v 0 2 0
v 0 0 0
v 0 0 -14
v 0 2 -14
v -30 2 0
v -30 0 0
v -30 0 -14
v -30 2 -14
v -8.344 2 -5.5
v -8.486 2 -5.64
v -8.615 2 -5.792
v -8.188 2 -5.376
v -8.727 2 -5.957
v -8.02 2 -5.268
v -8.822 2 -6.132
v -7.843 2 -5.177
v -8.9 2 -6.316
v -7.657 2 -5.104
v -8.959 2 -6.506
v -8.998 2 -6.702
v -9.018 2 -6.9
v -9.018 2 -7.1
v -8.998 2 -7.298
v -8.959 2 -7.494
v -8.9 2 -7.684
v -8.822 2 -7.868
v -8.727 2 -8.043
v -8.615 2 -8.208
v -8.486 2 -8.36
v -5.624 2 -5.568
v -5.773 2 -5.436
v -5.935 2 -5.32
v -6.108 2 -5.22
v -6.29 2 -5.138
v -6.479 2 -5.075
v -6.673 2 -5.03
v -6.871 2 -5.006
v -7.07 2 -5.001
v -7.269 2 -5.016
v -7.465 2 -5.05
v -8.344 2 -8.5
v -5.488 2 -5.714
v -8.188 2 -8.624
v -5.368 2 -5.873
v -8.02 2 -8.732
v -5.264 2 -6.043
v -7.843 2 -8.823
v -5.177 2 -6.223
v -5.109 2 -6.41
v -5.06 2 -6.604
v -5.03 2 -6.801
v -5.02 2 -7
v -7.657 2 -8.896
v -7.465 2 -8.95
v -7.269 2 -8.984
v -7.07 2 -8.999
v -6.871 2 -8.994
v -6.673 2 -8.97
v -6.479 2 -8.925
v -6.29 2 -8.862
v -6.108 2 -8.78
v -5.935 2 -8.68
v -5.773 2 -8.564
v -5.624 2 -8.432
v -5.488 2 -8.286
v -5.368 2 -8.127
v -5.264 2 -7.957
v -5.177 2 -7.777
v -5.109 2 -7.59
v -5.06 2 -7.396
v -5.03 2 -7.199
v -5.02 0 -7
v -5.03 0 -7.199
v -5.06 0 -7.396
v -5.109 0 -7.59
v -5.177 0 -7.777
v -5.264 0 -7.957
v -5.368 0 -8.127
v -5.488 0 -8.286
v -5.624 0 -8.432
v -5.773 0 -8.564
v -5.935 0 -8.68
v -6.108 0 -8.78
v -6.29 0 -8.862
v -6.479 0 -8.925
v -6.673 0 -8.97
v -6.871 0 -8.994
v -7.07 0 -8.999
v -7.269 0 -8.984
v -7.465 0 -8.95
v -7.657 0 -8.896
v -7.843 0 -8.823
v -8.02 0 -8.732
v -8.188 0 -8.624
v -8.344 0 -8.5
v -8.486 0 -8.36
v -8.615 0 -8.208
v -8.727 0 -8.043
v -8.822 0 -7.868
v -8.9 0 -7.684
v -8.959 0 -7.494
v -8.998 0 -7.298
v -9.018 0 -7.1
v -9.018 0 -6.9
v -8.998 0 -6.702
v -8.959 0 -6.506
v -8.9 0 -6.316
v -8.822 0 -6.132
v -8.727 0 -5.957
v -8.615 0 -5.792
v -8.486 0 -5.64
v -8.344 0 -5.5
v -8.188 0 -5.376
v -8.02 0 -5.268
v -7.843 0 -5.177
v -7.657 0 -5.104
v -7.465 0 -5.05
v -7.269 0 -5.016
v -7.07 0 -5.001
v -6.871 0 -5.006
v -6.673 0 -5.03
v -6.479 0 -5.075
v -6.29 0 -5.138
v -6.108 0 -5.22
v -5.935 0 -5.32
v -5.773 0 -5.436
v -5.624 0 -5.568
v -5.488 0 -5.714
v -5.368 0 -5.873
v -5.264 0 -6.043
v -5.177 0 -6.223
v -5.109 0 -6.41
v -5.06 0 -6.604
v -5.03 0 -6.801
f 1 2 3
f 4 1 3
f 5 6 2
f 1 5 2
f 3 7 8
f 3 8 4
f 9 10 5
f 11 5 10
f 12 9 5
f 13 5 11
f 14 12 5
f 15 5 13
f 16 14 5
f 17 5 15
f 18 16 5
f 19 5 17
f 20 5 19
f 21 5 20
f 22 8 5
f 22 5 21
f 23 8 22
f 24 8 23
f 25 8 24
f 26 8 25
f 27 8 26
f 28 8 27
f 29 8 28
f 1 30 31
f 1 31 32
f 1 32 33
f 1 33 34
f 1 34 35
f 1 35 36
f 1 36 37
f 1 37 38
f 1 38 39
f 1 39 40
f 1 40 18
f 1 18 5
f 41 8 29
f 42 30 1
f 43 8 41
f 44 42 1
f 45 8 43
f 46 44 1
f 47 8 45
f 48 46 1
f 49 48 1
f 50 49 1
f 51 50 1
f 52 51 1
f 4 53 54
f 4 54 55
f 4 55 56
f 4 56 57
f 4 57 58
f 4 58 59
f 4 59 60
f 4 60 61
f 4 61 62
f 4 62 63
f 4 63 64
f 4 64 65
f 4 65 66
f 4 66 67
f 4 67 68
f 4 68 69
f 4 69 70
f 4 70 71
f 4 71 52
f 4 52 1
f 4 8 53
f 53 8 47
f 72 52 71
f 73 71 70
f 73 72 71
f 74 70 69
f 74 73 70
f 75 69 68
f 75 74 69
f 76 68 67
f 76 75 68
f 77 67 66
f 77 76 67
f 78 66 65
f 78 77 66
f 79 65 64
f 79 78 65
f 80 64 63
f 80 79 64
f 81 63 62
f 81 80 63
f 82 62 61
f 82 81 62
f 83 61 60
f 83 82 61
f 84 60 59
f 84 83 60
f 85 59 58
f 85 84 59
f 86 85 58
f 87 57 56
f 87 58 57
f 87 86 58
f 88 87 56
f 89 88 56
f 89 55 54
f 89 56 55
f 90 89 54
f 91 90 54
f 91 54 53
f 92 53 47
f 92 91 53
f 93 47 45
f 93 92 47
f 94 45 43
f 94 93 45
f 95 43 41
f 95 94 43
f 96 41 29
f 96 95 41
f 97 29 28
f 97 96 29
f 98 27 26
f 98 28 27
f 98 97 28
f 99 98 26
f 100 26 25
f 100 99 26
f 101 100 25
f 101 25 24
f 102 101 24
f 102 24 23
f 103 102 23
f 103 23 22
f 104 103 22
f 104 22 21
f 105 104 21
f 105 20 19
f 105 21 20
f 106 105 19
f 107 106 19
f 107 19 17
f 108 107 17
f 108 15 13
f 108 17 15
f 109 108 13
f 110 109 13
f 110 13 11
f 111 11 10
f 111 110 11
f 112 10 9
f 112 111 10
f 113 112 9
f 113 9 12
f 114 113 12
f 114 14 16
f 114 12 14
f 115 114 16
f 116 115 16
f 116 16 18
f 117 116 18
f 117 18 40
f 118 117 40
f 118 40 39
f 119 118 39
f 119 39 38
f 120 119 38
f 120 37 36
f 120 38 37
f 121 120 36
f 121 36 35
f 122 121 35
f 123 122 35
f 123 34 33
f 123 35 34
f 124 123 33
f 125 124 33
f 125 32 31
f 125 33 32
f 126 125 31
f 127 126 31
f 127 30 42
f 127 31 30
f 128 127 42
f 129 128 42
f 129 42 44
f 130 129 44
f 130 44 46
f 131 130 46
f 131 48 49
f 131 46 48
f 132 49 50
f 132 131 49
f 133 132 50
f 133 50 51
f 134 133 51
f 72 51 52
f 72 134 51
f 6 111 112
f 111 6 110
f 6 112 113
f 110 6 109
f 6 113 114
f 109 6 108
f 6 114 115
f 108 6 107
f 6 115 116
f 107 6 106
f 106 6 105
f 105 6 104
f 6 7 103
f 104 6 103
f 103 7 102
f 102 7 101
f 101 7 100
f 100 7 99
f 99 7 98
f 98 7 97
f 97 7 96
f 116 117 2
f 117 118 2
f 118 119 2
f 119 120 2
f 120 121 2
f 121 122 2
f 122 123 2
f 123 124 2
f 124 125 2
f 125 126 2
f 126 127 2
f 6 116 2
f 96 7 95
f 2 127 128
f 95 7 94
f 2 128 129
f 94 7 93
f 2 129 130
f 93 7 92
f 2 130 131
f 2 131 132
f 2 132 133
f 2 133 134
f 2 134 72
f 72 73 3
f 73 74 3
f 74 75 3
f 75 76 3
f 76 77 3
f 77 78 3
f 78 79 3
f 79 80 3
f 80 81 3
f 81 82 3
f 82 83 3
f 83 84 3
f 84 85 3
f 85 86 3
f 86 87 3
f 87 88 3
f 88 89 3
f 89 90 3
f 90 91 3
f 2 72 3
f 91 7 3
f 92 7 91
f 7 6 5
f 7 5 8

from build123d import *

# Parameters (mm, degrees)
SKETCH1_W                = 30
SKETCH1_H                = 14
BOSS_EXTRUDE1_DEPTH      = 2
SKETCH1_9_OUTSIDE_W      = 38.634
SKETCH1_9_OUTSIDE_H      = 22.634
SKETCH1_9_OUTSIDE_W_2    = 30
SKETCH1_9_OUTSIDE_H_2    = 14
SKETCH1_9_OUTSIDE_R      = 2
CUT_EXTRUDE10_DEPTH      = 3
CUT_EXTRUDE10_DEPTH_BACK = 1


with BuildPart() as part:
    # Sketch1 → Boss-Extrude1 (new body)
    with BuildSketch(Plane(origin=(0, 0, 0), x_dir=(1, 0, 0), z_dir=(0, 1, 0))):
        with Locations((-15, 7)):
            Rectangle(SKETCH1_W, SKETCH1_H)
    extrude(amount=BOSS_EXTRUDE1_DEPTH)

    # Sketch1<9> outside → Cut-Extrude10 (cut, two sides)
    with BuildSketch(Plane(origin=(0, 0, 0), x_dir=(1, 0, 0), z_dir=(0, 1, 0))) as cut_extrude10_sk:
        with Locations((-15, 7)):
            Rectangle(SKETCH1_9_OUTSIDE_W, SKETCH1_9_OUTSIDE_H)
        with Locations((-15, 7)):
            Rectangle(SKETCH1_9_OUTSIDE_W_2, SKETCH1_9_OUTSIDE_H_2, mode=Mode.SUBTRACT)
        with Locations((-7.020370045, 7)):
            Circle(SKETCH1_9_OUTSIDE_R)
    extrude(amount=CUT_EXTRUDE10_DEPTH, mode=Mode.SUBTRACT)
    extrude(cut_extrude10_sk.sketch, amount=-CUT_EXTRUDE10_DEPTH_BACK, mode=Mode.SUBTRACT)


solid = part.part
